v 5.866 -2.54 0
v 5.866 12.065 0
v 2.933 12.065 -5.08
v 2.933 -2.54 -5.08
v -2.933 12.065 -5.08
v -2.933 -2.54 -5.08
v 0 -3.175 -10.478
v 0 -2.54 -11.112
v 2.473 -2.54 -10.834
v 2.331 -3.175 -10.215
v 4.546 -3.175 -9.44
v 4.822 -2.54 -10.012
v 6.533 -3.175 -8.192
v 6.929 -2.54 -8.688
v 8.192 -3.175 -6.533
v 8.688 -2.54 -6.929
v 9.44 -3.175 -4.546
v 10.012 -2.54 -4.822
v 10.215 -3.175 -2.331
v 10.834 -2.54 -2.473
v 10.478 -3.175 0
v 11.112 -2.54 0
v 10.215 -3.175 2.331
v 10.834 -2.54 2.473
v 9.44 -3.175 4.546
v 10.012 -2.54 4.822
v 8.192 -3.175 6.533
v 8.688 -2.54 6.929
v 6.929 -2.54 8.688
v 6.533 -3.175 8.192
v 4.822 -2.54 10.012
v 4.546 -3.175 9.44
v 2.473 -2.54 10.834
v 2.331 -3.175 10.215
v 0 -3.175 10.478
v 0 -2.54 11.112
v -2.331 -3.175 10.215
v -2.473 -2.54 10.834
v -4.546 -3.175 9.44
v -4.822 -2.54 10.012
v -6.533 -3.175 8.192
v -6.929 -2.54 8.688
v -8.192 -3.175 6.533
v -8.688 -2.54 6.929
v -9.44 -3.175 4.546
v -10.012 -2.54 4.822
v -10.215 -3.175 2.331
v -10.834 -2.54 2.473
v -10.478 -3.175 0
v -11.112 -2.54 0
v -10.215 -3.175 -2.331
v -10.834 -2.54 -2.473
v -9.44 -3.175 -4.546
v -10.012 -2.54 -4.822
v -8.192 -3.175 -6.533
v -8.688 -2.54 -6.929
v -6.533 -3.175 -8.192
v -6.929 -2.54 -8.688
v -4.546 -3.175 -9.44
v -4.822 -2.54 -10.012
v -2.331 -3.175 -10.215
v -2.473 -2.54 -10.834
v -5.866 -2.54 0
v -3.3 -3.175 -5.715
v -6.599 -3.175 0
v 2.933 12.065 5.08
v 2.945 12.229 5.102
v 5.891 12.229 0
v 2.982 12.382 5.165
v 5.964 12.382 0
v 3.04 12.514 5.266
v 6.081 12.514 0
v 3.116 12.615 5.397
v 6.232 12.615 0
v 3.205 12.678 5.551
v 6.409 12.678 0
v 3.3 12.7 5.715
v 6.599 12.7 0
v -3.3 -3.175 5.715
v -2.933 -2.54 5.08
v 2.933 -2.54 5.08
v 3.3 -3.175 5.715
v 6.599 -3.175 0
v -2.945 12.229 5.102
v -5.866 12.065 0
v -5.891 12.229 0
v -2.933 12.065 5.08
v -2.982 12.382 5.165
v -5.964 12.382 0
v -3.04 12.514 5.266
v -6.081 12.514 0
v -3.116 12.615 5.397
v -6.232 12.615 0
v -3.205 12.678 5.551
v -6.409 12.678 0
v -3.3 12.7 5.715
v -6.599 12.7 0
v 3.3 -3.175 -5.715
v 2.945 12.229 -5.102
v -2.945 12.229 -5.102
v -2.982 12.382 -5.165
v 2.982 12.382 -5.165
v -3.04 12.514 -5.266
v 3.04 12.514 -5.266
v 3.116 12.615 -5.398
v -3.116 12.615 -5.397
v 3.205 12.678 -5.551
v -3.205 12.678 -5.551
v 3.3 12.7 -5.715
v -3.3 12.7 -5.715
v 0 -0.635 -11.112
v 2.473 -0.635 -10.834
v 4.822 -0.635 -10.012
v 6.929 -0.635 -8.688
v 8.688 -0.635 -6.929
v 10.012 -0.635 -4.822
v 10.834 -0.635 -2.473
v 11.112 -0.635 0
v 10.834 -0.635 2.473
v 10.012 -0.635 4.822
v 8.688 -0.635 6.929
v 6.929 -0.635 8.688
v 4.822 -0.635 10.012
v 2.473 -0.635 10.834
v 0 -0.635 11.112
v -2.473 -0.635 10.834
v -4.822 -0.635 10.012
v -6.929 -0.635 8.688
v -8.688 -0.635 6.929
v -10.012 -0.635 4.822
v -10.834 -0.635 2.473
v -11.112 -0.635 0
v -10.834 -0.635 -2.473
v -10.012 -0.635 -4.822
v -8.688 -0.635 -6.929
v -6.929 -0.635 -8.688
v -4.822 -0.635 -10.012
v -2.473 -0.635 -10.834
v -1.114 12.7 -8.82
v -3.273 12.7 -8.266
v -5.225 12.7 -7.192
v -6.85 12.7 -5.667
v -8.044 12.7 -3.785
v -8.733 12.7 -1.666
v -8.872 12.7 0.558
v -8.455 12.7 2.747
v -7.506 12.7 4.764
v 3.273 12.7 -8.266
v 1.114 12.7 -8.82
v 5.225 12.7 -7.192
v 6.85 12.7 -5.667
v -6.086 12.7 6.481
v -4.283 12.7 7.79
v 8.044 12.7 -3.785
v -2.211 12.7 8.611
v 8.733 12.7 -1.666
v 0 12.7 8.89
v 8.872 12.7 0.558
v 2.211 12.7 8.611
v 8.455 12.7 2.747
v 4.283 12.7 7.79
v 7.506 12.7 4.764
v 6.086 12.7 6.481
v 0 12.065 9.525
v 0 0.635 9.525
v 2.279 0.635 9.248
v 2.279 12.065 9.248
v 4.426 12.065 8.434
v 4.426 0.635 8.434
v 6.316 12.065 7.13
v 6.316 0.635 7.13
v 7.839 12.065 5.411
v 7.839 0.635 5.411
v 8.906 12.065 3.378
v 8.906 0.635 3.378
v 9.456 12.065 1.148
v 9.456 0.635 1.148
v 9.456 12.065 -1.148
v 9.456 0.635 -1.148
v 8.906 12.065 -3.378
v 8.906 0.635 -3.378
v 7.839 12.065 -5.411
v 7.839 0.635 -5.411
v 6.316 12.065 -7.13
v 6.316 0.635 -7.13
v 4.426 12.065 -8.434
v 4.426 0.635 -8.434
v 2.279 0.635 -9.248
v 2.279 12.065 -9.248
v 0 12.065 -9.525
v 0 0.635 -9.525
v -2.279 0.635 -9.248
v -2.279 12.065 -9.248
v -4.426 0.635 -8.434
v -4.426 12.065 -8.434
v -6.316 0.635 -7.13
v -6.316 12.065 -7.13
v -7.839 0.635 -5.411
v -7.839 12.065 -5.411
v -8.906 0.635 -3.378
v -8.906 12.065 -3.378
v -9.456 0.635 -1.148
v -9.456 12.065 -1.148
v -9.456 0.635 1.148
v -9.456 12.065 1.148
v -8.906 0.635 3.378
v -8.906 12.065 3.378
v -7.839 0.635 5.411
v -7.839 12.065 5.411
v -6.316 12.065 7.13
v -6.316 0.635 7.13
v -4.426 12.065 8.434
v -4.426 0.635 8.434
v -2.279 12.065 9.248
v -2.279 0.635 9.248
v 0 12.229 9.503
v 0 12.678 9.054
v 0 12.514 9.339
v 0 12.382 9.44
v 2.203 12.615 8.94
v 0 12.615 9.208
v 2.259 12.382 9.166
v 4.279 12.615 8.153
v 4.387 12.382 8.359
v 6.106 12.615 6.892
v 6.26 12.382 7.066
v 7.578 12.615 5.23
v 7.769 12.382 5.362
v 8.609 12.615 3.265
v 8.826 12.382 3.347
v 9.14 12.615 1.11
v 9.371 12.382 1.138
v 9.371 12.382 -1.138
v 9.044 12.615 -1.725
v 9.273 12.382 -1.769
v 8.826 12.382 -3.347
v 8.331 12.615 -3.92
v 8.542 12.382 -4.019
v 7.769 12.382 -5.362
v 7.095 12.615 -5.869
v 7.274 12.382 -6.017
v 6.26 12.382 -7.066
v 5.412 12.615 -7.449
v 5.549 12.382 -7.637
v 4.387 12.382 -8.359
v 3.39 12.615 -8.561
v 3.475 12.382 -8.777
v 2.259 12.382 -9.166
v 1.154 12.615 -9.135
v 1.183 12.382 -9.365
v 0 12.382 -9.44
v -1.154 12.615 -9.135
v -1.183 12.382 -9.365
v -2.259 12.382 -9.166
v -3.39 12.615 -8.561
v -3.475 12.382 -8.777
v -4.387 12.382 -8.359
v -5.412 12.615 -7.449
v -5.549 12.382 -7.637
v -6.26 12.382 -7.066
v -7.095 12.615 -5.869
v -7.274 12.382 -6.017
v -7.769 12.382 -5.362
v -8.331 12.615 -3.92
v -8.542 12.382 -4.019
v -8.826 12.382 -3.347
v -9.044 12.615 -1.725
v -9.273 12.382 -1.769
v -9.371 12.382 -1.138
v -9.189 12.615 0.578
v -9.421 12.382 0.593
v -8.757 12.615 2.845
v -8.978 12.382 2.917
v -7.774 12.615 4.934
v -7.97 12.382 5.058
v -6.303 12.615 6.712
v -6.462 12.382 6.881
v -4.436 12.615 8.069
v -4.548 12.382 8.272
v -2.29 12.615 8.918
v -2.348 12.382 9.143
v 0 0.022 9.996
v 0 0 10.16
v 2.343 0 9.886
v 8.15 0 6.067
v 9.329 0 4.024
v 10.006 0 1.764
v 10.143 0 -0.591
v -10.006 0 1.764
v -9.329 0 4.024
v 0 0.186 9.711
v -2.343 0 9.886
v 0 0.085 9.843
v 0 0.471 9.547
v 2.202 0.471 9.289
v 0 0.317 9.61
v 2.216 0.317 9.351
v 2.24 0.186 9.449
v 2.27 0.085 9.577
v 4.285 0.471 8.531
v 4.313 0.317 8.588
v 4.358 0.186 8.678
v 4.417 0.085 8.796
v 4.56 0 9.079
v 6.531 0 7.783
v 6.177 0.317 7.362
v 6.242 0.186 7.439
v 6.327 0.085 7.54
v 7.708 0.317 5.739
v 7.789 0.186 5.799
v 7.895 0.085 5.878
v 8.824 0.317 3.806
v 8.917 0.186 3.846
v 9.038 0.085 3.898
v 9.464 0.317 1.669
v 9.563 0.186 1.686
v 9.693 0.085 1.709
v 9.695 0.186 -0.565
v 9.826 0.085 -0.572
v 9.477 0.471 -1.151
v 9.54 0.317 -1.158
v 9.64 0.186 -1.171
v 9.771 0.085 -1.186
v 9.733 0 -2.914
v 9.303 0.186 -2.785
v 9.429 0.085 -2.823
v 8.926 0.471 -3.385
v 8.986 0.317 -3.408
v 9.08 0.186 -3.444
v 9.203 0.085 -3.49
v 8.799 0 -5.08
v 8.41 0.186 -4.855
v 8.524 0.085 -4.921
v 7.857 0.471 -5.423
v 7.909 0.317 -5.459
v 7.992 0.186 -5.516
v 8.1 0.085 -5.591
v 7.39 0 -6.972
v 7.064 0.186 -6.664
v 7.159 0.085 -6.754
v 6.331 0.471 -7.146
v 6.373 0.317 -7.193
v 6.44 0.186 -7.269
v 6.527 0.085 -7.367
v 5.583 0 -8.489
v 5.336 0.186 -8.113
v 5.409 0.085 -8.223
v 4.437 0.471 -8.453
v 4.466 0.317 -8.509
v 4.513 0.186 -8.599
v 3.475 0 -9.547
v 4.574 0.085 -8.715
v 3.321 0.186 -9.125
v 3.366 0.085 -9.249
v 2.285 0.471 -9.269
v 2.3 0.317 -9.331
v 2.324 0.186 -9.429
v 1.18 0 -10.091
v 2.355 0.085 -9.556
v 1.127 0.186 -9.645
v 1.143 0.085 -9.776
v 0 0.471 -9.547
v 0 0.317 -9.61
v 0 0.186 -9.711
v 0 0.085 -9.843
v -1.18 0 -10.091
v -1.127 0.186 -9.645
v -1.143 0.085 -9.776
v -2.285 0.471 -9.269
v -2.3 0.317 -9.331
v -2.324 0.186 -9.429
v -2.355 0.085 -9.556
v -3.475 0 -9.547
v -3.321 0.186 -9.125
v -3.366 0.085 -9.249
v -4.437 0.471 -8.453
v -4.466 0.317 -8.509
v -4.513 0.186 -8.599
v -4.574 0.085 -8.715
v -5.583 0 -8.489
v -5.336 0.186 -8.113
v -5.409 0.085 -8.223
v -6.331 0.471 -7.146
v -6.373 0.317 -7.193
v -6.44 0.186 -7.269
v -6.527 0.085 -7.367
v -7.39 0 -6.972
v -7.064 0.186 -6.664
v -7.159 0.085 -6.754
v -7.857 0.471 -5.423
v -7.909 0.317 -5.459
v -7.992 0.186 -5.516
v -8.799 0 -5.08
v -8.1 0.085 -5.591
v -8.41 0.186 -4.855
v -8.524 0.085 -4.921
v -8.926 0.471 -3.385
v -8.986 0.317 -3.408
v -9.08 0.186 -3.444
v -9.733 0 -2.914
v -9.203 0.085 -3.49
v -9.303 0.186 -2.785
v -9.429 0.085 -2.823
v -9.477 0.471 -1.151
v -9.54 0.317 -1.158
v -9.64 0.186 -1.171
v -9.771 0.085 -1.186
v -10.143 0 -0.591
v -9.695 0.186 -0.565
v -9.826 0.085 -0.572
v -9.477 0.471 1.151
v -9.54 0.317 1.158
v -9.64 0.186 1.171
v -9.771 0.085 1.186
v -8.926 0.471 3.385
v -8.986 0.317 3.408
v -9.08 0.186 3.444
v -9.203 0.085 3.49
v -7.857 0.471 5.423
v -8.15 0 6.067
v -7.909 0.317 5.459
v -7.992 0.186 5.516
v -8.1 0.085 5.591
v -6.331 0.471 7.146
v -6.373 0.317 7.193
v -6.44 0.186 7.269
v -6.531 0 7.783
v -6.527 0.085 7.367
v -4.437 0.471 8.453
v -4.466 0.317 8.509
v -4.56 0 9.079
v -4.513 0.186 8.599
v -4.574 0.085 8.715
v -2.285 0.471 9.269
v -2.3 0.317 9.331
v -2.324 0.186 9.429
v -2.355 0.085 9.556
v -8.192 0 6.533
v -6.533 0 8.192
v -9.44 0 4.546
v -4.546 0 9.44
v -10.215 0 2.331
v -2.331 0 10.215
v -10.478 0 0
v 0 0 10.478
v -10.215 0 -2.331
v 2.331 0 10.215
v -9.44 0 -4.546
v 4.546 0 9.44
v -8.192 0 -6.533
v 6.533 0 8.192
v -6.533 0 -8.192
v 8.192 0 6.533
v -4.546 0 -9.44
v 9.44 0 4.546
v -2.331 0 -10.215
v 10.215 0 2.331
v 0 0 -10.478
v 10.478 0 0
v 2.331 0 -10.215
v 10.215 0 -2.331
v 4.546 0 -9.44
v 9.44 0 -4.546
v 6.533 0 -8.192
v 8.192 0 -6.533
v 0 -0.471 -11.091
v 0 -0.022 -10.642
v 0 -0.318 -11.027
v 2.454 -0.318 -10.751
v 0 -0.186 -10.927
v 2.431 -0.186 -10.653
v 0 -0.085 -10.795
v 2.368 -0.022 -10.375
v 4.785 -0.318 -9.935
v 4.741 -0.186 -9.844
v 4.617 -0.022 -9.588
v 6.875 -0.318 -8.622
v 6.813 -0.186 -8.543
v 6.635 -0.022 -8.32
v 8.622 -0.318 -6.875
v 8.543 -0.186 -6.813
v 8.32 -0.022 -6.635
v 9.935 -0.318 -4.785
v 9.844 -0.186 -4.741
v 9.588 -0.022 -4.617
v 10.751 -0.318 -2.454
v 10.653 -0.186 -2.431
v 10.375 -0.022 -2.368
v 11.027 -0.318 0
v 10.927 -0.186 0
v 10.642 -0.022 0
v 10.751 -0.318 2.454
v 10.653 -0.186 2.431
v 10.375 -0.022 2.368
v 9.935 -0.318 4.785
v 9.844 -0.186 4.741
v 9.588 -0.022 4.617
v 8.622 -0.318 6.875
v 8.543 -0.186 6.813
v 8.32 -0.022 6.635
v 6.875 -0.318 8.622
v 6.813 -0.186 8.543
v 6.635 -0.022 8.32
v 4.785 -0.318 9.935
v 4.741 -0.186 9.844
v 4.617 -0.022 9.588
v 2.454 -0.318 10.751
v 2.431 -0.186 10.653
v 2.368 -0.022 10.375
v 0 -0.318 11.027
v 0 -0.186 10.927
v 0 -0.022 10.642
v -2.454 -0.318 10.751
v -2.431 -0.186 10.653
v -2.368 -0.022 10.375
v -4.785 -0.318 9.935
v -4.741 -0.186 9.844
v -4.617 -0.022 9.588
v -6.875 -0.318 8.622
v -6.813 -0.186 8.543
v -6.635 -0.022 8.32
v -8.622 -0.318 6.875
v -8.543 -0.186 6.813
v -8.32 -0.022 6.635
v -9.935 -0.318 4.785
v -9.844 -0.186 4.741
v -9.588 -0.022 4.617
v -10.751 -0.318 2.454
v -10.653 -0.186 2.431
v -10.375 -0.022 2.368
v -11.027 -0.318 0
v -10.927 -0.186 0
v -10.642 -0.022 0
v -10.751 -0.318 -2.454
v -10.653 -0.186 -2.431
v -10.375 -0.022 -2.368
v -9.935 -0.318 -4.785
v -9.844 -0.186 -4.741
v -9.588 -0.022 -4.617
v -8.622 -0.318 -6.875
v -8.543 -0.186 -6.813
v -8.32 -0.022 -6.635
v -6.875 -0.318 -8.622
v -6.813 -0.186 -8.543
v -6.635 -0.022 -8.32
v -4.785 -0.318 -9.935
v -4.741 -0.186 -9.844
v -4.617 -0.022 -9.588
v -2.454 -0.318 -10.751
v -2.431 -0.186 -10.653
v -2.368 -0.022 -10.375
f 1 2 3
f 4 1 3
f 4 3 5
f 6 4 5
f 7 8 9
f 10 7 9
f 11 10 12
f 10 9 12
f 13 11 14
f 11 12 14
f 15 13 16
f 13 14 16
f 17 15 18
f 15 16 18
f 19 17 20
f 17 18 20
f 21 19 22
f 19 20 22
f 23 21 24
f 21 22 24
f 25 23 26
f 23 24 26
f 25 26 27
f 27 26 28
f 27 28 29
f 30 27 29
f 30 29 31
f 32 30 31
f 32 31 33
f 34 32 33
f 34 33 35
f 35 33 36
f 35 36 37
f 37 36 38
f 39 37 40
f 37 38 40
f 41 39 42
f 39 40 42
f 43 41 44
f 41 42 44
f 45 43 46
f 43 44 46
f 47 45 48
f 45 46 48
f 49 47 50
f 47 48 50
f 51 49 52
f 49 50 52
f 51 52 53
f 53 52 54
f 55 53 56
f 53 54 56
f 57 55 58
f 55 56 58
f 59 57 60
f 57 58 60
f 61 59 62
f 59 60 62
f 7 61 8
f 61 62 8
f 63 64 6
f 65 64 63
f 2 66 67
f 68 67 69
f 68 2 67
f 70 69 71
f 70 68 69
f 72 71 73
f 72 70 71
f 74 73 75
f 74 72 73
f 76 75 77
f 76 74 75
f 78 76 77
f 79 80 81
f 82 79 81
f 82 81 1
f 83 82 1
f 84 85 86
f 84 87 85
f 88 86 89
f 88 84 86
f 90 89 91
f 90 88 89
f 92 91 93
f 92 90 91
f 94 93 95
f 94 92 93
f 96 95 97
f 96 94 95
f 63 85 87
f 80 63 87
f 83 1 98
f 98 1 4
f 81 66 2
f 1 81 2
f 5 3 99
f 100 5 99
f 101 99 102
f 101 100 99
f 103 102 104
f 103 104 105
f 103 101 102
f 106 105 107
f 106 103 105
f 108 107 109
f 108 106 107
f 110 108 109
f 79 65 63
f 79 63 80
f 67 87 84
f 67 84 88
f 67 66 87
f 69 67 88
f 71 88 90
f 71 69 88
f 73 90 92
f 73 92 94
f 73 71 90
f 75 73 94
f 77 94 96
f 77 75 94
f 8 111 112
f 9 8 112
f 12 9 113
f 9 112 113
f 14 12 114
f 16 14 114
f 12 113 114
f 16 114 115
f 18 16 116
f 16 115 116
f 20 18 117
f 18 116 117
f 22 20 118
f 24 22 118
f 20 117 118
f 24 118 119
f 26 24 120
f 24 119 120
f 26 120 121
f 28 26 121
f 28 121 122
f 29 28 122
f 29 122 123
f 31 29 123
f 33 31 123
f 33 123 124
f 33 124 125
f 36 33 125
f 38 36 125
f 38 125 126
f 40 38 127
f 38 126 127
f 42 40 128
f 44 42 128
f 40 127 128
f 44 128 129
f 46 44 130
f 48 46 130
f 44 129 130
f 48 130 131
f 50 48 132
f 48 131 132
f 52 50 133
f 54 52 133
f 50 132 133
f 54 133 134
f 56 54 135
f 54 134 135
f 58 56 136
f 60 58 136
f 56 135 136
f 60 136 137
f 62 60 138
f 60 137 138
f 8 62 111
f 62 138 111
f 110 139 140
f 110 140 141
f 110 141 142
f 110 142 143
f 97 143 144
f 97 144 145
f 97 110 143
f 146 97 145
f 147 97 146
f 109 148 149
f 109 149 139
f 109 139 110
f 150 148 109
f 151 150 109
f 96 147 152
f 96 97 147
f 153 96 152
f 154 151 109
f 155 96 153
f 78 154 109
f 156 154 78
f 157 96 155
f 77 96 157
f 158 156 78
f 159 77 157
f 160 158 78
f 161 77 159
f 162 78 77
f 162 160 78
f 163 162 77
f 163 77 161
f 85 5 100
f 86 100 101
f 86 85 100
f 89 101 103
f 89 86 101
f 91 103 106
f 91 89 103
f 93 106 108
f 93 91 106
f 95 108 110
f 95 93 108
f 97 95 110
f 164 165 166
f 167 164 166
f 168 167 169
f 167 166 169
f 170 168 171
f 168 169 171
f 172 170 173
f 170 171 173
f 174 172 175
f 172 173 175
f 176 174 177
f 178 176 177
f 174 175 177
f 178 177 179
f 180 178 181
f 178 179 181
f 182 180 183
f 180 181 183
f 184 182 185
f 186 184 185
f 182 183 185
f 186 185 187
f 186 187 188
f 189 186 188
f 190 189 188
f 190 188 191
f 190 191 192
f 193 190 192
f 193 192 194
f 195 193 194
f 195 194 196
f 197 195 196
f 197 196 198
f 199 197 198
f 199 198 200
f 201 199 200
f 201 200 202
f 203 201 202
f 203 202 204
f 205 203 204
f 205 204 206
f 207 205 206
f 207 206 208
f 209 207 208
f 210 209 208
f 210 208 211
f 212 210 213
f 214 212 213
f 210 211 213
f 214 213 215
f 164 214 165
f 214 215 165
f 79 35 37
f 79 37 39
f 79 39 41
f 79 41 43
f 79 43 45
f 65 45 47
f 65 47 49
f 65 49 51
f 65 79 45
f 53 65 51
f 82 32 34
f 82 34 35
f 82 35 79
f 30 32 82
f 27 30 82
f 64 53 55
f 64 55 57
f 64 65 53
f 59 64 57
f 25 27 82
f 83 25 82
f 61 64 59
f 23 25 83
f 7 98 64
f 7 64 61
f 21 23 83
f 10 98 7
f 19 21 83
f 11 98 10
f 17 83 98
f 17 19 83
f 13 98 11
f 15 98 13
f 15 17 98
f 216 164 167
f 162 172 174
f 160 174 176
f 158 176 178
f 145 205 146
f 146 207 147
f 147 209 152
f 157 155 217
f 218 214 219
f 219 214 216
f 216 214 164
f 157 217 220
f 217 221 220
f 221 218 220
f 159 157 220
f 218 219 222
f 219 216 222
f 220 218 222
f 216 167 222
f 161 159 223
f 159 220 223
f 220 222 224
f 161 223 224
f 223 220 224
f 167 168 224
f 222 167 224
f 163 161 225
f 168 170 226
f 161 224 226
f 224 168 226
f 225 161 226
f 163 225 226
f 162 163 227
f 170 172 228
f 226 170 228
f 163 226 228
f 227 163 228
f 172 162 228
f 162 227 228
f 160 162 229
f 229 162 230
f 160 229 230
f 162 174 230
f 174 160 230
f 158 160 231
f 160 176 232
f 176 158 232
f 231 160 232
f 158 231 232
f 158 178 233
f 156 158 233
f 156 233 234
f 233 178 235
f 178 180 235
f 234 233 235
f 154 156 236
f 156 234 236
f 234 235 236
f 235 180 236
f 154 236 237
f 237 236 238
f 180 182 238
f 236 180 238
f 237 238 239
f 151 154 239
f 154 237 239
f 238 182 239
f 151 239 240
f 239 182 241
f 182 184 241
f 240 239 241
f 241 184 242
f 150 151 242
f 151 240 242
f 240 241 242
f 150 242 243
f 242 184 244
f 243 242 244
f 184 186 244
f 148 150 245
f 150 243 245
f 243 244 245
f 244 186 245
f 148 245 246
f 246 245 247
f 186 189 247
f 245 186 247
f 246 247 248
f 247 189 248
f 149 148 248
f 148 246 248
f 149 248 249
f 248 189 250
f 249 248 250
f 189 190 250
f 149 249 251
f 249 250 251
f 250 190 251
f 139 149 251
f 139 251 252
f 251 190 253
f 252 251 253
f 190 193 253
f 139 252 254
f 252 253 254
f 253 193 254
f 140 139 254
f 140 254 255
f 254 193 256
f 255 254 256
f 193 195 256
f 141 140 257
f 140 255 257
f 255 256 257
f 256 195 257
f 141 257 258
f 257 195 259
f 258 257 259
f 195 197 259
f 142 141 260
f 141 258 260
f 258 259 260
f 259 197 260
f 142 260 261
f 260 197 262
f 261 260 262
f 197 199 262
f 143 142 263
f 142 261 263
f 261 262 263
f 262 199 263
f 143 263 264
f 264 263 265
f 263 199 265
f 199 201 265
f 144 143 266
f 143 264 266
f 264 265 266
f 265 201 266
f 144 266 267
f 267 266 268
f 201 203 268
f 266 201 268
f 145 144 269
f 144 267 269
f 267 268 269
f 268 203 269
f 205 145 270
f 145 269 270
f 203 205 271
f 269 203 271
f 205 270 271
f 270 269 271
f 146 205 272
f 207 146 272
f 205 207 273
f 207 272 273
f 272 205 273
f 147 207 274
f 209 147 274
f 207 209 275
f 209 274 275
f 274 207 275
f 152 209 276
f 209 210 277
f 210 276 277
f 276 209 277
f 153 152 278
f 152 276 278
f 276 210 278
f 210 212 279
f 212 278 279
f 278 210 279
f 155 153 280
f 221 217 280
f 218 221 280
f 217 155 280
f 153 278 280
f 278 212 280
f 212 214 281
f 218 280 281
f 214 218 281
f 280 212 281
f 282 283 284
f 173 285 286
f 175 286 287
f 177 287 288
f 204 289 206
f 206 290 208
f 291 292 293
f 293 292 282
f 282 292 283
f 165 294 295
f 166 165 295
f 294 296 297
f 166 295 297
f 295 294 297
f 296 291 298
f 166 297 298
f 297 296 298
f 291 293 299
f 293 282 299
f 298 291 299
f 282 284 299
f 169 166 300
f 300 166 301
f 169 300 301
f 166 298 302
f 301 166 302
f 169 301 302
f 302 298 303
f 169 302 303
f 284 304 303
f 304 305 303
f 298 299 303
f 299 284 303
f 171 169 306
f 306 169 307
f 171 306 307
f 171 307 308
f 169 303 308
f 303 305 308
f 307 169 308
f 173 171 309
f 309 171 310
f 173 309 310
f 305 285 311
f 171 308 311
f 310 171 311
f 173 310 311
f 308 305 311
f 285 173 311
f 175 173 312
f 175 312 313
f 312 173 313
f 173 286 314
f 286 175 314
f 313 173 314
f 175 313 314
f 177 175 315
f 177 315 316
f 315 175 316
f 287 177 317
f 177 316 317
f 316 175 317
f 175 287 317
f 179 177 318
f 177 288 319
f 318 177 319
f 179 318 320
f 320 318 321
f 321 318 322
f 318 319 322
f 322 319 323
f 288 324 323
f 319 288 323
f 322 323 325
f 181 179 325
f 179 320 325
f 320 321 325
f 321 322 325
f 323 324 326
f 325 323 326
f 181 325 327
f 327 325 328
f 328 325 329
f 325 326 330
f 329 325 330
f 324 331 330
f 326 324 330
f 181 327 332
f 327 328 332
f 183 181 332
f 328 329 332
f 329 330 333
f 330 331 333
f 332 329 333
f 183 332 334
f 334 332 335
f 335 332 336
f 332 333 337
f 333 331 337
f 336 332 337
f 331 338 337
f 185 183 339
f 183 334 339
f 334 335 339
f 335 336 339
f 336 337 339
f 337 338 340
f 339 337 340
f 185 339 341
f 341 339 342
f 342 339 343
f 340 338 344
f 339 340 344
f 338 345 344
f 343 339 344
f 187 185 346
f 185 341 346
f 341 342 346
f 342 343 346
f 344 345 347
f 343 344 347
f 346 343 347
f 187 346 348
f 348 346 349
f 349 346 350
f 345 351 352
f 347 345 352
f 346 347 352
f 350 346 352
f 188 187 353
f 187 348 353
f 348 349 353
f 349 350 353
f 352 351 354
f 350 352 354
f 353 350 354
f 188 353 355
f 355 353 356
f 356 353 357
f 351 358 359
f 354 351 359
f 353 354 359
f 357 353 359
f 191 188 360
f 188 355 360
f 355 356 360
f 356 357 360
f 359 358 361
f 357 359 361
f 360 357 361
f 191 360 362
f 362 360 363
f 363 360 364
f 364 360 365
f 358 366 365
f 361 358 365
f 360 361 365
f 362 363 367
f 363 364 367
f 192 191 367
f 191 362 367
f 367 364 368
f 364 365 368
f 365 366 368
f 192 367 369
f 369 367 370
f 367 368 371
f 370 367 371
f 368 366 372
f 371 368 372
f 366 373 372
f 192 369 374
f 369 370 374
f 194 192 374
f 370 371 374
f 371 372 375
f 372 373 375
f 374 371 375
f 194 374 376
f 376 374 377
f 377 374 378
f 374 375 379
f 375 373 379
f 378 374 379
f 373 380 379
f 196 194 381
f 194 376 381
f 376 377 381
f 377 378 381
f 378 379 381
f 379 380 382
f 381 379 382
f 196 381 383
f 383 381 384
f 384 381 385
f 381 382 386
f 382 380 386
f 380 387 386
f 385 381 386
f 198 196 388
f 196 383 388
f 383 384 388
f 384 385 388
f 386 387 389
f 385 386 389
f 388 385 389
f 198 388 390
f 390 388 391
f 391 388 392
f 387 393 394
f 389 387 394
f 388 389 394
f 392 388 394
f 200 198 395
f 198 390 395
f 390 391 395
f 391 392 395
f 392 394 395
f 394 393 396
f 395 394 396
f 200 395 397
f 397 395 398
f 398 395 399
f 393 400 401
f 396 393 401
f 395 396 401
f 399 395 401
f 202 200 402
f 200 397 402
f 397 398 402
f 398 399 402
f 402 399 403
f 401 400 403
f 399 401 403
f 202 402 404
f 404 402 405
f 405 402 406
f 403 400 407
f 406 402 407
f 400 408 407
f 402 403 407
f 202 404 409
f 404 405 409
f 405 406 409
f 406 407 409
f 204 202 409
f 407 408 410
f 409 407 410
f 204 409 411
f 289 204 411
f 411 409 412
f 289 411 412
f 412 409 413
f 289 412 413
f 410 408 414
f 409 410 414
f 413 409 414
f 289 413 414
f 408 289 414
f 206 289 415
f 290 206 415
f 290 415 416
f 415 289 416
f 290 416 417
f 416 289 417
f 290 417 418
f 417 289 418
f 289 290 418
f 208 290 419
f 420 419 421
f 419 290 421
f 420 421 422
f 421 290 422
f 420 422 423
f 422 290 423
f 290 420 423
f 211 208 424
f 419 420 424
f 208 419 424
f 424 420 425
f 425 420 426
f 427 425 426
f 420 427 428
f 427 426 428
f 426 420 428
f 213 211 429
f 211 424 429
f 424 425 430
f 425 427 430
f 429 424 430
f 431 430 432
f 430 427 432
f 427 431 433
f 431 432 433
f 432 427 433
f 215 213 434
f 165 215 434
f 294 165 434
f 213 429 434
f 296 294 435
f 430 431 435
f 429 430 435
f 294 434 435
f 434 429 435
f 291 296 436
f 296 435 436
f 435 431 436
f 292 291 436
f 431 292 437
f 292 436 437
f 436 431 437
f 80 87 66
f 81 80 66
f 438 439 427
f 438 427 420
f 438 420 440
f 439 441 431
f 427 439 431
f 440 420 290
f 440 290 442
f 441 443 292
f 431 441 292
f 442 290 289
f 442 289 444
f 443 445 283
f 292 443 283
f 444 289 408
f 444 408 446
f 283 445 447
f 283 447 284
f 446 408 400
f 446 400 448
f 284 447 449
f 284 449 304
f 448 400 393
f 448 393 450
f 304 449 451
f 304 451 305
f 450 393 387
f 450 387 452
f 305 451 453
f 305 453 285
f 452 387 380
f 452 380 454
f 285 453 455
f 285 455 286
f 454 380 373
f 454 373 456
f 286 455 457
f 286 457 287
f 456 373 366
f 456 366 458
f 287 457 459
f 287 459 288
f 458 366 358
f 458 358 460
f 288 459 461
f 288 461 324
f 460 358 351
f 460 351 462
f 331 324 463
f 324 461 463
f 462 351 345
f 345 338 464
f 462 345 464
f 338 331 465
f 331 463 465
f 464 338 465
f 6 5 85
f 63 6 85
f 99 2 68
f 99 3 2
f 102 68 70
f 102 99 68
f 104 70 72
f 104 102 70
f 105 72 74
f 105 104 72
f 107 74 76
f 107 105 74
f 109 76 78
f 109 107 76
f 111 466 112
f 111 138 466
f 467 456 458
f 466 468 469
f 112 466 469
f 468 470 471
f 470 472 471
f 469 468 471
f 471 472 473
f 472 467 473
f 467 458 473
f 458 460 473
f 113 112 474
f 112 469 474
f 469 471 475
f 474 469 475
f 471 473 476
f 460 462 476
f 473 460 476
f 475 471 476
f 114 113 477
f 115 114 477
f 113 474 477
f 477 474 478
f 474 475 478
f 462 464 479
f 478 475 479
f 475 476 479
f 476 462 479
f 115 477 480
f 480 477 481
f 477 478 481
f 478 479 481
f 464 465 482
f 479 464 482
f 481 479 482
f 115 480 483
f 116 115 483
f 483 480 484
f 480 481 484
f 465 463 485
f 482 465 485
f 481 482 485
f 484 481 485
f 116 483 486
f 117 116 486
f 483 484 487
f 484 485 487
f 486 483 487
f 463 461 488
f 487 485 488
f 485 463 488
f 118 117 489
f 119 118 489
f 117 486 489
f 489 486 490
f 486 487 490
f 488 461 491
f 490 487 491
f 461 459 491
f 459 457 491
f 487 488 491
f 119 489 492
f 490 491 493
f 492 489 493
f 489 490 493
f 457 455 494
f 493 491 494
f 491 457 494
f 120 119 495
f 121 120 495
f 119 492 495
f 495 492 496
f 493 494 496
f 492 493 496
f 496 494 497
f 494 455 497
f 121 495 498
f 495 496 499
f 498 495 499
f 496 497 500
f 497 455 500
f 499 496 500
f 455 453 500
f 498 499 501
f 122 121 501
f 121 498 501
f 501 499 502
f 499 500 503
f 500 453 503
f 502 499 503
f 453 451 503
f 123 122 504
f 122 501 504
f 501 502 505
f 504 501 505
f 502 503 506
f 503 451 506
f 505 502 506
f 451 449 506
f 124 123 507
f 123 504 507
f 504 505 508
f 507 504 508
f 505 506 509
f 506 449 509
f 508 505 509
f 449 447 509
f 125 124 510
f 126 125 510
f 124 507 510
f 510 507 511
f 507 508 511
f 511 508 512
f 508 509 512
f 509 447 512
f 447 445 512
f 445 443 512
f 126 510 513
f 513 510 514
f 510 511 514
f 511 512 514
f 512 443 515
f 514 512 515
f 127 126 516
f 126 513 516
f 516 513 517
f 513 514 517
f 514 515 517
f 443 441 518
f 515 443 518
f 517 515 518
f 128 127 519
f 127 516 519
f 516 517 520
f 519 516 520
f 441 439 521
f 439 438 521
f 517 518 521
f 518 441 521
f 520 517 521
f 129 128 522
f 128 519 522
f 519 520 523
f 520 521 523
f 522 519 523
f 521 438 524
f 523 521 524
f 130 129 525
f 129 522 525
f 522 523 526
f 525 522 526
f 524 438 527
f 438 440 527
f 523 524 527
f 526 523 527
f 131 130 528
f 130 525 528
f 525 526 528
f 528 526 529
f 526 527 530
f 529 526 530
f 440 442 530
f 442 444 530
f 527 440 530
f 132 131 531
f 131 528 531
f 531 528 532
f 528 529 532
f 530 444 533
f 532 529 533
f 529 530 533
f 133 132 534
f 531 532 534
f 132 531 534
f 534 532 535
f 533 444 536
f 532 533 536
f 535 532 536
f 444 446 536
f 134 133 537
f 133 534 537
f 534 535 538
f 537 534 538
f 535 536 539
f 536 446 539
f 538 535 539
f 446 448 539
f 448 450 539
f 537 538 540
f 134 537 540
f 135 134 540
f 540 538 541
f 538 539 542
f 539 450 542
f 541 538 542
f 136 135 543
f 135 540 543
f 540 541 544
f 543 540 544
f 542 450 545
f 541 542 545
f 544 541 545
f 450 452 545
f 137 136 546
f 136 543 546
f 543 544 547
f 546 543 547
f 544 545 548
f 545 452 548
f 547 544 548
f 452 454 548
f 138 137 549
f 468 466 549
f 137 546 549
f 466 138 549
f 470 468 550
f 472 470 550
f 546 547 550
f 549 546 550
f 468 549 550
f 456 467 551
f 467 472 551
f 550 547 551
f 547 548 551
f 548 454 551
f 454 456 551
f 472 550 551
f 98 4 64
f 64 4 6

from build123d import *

# Parameters (mm, degrees)
SKETCH1_R           = 9.525
BOSS_EXTRUDE1_DEPTH = 7.9375
SKETCH2_R           = 9.525
BOSS_EXTRUDE2_DEPTH = 4.7625
SKETCH3_R           = 11.1125
BOSS_EXTRUDE3_DEPTH = 3.175
FILLET1_R           = 0.635
FILLET3_R           = 0.635
CHAMFER1_SIZE       = 0.635


with BuildPart() as part:
    # Sketch1 → Boss-Extrude1 (new body)
    with BuildSketch(Plane(origin=(0, 0, 0), x_dir=(1, 0, 0), z_dir=(0, 1, 0))):
        with Locations(Location((0, 0, 0), (0, 0, 270))):
            Circle(SKETCH1_R)
        Polygon((5.865878735, 0), (2.932939367, 5.08), (-2.932939367, 5.08), (-5.865878735, 0), (-2.932939367, -5.08), (2.932939367, -5.08), align=None, mode=Mode.SUBTRACT)
    extrude(amount=BOSS_EXTRUDE1_DEPTH)

    # Sketch2 → Boss-Extrude2 (add)
    with BuildSketch(Plane(origin=(0, 7.9375, 0), x_dir=(1, 0, 0), z_dir=(0, 1, 0))):
        with Locations(Location((0, 0, 0), (0, 0, 270))):
            Circle(SKETCH2_R)
        Polygon((-2.932939367, 5.08), (-5.865878735, 0), (-2.932939367, -5.08), (2.932939367, -5.08), (5.865878735, 0), (2.932939367, 5.08), align=None, mode=Mode.SUBTRACT)
    extrude(amount=BOSS_EXTRUDE2_DEPTH)

    # Sketch3 → Boss-Extrude3 (add)
    with BuildSketch(Plane.XZ):
        with Locations(Location((0, 0, 0), (0, 0, 270))):
            Circle(SKETCH3_R)
        Polygon((-2.932939367, 5.08), (2.932939367, 5.08), (5.865878735, 0), (2.932939367, -5.08), (-2.932939367, -5.08), (-5.865878735, 0), align=None, mode=Mode.SUBTRACT)
    extrude(amount=BOSS_EXTRUDE3_DEPTH)

    # Fillet1
    fillet1_edges = [part.edges().sort_by_distance(p)[0] for p in [
        (0, 0, -9.525),
        (0, 0, 11.1125),
    ]]
    fillet(fillet1_edges, radius=FILLET1_R)

    # Fillet3
    fillet3_edges = [part.edges().sort_by_distance(p)[0] for p in [
        (0, 12.7, -9.525),
        (0, 12.7, -5.08),
        (-4.399409051, 12.7, -2.54),
        (-4.399409051, 12.7, 2.54),
        (0, 12.7, 5.08),
        (4.399409051, 12.7, 2.54),
        (4.399409051, 12.7, -2.54),
    ]]
    fillet(fillet3_edges, radius=FILLET3_R)

    # Chamfer1
    chamfer1_edges = [part.edges().sort_by_distance(p)[0] for p in [
        (0, -3.175, 11.1125),
        (-4.399409051, -3.175, 2.54),
        (-4.399409051, -3.175, -2.54),
        (0, -3.175, -5.08),
        (4.399409051, -3.175, -2.54),
        (4.399409051, -3.175, 2.54),
        (0, -3.175, 5.08),
    ]]
    chamfer(chamfer1_edges, length=CHAMFER1_SIZE)


solid = part.part
